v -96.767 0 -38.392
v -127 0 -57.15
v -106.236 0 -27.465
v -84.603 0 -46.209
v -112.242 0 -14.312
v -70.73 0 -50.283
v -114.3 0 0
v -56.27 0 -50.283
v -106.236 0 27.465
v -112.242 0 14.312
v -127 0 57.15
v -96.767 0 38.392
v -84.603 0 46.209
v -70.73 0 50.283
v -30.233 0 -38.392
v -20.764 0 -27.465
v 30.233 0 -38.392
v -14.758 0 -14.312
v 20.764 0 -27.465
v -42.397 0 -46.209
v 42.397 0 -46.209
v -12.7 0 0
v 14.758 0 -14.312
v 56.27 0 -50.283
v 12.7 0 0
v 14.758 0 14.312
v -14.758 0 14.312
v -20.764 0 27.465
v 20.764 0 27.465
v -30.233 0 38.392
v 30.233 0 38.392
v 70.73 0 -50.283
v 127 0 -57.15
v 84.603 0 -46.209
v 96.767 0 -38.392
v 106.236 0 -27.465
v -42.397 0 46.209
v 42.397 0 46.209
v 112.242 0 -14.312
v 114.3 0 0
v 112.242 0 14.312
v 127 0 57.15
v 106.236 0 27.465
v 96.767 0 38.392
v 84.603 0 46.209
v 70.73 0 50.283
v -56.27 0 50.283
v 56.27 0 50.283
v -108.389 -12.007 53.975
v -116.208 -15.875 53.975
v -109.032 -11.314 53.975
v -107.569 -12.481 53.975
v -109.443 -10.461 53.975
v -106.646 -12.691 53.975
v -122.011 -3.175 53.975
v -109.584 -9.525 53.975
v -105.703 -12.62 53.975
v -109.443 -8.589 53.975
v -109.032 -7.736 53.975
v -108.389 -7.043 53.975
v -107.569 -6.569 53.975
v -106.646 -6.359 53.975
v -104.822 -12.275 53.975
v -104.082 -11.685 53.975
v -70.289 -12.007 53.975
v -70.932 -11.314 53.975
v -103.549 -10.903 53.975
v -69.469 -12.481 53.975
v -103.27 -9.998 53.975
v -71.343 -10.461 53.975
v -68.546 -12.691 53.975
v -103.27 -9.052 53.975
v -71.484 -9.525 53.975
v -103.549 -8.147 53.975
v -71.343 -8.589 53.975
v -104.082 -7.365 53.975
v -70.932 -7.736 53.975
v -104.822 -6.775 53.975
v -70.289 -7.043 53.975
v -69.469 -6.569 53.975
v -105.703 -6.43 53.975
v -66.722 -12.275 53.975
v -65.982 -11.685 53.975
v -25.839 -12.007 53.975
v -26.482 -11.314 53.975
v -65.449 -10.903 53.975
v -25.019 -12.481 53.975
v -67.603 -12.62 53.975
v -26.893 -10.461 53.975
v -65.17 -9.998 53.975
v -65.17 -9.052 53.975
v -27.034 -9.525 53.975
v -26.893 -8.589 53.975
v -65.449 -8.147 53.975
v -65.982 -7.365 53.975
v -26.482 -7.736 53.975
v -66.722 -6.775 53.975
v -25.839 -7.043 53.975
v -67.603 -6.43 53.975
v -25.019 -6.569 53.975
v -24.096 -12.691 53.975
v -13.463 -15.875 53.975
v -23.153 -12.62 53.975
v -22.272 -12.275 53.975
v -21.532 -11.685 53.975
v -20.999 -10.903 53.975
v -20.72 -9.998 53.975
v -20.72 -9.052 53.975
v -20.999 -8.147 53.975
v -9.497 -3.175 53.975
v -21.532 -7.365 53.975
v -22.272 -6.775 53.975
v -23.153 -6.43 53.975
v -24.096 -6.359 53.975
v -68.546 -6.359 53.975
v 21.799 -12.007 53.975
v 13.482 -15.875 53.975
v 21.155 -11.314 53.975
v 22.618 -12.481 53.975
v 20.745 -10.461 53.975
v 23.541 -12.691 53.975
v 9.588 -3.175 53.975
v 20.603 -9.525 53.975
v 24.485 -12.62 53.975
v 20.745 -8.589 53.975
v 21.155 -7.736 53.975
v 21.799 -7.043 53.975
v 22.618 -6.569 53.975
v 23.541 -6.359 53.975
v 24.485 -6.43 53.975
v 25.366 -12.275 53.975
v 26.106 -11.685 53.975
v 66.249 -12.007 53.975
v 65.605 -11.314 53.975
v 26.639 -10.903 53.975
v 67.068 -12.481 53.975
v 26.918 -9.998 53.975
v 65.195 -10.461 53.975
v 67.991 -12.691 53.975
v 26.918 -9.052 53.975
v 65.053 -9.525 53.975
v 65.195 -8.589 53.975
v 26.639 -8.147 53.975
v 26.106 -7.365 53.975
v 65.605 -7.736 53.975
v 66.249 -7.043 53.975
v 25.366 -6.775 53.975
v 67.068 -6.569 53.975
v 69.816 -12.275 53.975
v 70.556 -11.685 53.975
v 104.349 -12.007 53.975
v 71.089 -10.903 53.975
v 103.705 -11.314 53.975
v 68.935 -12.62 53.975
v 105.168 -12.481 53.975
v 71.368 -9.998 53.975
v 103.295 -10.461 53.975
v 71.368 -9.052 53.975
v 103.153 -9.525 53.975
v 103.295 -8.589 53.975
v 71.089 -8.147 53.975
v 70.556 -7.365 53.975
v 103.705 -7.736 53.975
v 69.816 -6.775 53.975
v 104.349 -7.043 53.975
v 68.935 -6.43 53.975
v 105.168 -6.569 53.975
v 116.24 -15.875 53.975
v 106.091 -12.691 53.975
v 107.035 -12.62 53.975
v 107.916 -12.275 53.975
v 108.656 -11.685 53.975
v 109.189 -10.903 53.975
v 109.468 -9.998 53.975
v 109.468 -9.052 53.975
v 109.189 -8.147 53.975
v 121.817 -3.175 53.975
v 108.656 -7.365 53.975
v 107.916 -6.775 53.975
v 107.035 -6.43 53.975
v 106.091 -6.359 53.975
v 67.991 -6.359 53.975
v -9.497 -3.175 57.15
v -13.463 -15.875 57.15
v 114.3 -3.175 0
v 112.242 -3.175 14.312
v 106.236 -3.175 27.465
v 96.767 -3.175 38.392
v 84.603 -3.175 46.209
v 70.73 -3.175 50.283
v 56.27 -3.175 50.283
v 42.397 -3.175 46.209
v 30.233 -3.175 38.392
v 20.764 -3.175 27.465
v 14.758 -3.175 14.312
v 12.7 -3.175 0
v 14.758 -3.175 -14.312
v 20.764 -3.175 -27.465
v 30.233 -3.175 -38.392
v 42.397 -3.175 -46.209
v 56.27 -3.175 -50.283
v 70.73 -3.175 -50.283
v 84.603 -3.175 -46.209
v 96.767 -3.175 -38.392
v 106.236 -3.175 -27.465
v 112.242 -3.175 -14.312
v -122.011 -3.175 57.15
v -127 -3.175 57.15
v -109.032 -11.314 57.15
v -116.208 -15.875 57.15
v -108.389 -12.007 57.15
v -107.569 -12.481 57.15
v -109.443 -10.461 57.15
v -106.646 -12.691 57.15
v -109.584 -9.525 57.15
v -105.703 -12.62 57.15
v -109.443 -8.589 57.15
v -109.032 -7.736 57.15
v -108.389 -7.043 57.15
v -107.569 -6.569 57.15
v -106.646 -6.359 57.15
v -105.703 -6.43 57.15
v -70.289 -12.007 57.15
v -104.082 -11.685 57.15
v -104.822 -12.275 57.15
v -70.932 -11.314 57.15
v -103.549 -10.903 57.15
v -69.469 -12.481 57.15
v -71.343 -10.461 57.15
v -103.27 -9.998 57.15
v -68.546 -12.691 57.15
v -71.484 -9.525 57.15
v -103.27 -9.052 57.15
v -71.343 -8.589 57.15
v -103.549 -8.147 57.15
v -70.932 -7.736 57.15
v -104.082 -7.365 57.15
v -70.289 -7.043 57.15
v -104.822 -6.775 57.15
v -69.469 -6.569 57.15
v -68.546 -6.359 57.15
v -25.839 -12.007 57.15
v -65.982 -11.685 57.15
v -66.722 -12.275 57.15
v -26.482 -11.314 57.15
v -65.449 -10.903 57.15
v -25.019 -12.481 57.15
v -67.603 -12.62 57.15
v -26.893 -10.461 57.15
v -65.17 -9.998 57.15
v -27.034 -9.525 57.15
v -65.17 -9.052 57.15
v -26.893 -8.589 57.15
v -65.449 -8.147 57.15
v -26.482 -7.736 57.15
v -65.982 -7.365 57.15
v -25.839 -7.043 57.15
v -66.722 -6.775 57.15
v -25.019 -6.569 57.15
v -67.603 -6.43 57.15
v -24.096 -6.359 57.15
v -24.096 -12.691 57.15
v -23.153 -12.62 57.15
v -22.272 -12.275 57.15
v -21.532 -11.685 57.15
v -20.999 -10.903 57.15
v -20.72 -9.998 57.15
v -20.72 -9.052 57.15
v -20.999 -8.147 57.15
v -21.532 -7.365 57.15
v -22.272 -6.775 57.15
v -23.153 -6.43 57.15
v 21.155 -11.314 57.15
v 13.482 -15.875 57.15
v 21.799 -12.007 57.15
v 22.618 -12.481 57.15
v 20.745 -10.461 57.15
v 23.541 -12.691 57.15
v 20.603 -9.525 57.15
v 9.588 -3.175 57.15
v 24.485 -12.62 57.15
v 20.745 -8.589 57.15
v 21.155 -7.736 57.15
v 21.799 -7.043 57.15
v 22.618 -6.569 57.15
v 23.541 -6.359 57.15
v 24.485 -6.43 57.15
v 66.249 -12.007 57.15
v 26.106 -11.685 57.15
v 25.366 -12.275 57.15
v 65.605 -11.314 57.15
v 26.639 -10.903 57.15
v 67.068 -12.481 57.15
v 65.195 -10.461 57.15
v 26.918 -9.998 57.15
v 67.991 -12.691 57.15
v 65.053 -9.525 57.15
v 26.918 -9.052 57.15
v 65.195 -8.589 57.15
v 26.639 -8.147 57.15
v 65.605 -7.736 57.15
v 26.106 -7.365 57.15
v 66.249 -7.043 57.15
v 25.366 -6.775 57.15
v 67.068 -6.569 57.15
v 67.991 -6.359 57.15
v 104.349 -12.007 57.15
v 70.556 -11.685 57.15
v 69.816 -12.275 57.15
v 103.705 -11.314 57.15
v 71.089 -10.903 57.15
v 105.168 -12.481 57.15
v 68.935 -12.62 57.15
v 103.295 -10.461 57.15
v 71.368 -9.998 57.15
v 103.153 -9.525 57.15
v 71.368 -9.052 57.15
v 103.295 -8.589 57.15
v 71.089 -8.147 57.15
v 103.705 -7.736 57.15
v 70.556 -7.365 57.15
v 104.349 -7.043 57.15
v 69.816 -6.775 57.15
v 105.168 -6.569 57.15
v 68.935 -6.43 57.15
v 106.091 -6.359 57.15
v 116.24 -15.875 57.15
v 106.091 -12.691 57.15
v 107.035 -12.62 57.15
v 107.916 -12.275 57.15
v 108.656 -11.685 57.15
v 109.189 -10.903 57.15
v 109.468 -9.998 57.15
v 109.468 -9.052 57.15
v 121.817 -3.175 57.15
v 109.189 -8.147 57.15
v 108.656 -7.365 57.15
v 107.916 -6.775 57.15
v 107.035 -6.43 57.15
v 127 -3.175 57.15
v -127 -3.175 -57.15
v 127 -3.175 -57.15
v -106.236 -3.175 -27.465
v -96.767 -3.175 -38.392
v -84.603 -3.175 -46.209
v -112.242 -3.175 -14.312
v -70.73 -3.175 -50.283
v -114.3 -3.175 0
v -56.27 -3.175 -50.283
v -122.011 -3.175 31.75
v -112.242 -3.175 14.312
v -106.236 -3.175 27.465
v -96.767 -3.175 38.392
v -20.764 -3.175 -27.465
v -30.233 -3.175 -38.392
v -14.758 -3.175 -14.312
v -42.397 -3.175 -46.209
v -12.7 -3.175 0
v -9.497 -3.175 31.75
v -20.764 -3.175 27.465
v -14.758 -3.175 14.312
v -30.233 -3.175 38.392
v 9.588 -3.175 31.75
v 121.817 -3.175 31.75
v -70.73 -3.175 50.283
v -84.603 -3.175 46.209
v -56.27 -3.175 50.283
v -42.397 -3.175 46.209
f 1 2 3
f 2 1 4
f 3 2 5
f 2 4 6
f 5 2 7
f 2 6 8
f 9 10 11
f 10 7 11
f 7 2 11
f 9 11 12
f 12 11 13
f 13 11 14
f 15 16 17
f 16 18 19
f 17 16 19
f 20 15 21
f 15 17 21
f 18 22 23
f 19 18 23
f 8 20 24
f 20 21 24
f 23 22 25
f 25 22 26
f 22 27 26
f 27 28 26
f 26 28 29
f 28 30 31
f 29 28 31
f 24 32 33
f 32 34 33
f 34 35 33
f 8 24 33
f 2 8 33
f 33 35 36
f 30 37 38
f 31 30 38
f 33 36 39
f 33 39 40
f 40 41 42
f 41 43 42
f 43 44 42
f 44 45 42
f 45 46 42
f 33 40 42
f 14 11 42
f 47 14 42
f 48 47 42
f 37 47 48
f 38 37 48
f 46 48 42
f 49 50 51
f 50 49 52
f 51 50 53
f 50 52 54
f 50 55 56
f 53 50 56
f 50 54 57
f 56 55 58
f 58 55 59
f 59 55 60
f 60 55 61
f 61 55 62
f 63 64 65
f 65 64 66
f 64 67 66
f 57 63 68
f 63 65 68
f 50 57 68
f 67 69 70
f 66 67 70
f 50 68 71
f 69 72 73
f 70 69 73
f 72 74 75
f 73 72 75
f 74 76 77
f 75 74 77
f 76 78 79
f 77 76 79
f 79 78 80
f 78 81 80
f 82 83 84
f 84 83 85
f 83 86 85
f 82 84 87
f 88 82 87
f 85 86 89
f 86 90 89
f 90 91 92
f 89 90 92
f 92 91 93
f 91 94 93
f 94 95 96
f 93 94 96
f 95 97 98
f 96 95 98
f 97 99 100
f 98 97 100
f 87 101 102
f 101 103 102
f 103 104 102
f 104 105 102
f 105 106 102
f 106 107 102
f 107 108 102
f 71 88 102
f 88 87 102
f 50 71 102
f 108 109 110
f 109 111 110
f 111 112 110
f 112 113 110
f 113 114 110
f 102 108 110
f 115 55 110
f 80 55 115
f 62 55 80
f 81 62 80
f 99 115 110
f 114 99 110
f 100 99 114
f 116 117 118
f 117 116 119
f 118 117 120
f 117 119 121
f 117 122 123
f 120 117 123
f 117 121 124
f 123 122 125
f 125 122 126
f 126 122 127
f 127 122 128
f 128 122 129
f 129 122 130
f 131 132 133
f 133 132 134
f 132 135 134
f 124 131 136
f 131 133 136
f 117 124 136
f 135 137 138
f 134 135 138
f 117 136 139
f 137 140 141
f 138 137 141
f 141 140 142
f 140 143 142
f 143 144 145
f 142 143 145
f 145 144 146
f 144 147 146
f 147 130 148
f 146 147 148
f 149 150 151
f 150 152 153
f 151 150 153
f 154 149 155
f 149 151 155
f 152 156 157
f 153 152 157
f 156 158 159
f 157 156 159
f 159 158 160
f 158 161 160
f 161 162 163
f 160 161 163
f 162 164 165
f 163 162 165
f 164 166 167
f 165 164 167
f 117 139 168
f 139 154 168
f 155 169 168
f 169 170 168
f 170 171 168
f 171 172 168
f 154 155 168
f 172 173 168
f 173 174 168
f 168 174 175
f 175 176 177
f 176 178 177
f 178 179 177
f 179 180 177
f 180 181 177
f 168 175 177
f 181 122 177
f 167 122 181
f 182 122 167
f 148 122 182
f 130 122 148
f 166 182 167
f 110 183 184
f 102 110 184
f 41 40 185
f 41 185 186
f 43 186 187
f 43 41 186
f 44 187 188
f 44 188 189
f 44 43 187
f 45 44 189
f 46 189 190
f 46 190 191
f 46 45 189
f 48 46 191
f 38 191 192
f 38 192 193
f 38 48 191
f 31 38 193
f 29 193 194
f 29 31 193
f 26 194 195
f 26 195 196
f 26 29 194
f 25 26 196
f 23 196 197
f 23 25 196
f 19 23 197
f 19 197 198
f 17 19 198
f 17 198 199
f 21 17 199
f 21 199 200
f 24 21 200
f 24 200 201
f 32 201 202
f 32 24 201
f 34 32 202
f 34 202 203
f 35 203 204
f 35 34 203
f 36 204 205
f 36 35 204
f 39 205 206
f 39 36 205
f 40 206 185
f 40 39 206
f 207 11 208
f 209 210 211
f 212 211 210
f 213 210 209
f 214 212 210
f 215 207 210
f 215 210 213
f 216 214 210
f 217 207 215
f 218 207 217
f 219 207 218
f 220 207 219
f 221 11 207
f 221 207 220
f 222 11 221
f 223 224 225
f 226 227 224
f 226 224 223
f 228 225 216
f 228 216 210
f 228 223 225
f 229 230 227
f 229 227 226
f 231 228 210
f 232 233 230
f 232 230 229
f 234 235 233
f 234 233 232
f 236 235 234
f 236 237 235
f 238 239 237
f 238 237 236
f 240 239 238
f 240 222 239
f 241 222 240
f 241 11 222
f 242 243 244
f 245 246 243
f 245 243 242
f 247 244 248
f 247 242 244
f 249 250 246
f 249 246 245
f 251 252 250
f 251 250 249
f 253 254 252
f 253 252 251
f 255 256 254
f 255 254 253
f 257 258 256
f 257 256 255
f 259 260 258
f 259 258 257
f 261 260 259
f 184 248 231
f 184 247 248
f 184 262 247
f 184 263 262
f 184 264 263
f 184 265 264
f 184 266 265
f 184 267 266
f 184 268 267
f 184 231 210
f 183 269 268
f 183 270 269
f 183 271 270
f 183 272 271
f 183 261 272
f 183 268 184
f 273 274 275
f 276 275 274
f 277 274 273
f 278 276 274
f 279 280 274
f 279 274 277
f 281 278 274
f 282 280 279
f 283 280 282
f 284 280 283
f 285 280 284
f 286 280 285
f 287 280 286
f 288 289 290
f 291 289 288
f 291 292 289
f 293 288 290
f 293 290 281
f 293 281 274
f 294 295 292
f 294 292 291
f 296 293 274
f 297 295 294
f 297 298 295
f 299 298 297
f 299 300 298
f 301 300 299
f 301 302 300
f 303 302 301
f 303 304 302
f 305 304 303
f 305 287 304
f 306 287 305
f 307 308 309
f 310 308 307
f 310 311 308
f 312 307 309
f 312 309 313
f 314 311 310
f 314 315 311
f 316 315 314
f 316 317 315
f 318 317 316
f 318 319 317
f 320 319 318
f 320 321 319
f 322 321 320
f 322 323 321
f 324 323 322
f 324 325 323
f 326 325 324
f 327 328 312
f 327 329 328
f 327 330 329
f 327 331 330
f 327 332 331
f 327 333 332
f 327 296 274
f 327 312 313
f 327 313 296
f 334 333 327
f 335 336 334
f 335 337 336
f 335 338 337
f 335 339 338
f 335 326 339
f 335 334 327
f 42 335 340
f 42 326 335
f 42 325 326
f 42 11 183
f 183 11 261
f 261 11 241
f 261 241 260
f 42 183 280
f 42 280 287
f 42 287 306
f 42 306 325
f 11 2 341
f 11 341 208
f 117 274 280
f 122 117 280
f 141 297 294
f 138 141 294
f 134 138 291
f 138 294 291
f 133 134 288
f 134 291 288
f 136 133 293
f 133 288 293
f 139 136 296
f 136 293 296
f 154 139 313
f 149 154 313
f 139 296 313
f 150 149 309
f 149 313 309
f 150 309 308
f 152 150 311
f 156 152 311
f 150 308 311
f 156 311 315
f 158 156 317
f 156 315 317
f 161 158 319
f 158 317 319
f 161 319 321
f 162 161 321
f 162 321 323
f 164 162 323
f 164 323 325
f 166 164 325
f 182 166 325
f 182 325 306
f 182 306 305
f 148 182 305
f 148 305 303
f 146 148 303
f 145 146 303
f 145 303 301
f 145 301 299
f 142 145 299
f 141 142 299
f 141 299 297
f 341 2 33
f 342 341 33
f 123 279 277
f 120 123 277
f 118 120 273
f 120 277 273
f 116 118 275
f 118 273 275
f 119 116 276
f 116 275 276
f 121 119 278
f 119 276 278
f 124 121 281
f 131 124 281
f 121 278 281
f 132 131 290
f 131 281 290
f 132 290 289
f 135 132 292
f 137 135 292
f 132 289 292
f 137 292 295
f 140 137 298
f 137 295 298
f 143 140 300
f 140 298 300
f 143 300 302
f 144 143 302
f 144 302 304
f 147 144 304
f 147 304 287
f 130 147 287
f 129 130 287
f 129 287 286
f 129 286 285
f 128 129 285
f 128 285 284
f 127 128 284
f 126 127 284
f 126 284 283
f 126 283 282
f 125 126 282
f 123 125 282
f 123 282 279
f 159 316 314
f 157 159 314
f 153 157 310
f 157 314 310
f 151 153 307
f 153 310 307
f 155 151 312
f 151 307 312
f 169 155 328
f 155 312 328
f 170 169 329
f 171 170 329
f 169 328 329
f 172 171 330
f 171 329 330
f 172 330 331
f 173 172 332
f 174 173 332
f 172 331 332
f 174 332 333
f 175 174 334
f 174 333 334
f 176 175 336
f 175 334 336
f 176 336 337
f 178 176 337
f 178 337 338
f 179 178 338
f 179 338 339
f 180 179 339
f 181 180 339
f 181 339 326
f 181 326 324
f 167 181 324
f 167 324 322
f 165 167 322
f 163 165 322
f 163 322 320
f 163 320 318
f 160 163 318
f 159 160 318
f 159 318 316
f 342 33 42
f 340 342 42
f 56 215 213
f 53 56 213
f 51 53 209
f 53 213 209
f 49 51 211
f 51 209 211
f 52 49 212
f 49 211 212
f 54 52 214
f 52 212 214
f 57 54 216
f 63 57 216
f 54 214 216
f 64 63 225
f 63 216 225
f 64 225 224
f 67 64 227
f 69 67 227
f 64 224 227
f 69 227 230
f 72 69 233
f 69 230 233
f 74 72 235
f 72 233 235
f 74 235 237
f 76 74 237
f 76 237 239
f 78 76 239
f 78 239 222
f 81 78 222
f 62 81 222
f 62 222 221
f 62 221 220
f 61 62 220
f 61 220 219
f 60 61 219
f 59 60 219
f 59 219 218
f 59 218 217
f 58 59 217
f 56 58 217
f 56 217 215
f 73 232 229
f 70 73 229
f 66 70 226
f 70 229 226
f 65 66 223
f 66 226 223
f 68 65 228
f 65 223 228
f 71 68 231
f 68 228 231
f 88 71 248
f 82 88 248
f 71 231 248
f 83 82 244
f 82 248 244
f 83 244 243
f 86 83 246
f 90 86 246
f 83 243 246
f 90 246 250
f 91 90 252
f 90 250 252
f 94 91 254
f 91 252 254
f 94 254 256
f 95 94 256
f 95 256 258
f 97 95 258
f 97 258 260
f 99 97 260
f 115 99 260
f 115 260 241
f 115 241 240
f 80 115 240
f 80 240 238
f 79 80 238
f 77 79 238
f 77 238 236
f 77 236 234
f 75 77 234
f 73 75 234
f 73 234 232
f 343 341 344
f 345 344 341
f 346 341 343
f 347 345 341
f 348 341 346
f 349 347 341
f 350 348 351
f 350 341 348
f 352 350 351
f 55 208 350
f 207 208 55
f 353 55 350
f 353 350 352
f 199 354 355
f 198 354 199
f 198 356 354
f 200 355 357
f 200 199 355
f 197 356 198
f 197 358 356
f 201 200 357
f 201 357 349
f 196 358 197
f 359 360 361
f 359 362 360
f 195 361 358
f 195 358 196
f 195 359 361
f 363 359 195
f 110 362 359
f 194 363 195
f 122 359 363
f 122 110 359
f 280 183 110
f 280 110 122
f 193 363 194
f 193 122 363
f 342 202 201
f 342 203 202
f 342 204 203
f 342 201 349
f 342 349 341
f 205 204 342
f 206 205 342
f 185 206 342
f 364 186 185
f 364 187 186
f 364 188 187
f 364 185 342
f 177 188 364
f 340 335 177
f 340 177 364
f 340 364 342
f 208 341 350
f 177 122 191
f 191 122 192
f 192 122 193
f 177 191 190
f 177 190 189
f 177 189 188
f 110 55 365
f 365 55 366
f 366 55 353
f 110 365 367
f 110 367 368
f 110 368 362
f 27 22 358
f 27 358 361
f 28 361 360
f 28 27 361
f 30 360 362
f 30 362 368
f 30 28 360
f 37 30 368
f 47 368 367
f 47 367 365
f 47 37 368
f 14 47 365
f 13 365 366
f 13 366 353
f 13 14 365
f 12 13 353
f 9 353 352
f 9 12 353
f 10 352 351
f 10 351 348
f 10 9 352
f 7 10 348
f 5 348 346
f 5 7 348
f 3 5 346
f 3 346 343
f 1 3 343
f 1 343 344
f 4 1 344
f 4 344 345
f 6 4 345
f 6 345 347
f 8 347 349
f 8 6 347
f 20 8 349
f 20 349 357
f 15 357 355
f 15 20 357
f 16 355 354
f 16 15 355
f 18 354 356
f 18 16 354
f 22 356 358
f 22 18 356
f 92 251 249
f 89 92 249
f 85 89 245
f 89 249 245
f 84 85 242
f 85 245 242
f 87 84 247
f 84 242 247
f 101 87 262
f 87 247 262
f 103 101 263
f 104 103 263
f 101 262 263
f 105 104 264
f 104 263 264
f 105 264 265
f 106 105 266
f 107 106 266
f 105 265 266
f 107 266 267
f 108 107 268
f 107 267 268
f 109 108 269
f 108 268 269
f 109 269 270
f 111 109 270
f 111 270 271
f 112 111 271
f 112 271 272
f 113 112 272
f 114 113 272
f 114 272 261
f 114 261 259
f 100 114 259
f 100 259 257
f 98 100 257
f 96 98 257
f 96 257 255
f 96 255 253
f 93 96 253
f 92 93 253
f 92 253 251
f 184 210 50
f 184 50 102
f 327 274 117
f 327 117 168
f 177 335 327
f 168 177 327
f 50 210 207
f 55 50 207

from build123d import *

# Parameters (mm, degrees)
F0_W     = 254
F0_H     = 114.3
F0_R     = 50.8
F1_DEPTH = 3.175
F2_W     = 112.5140171498
F2_H     = 3.175
F2_W_2   = 112.2281569988
F3_DEPTH = 12.7
F5_DEPTH = 25.4
F7_DEPTH = 25.4


with BuildPart() as f1:
    # F0 (on Front) → F1 (new body)
    with BuildSketch(Plane.XZ):
        Rectangle(F0_W, F0_H)
        with Locations((-63.5, 0)):
            Circle(F0_R, mode=Mode.SUBTRACT)
        with Locations((63.5, 0)):
            Circle(F0_R, mode=Mode.SUBTRACT)
    extrude(amount=F1_DEPTH)

    # F2 (on face) → F3 (join)
    with BuildSketch(Plane.XZ.offset(3.175)):
        with Locations((-65.7536098734, 55.5625)):
            Rectangle(F2_W, F2_H)
        with Locations((65.7025436531, 55.5625)):
            Rectangle(F2_W_2, F2_H)
    extrude(amount=F3_DEPTH)

    # F4 (on face) → F5 (cut)
    with BuildSketch(Plane.XY.offset(57.15)):
        Polygon((-116.2076666951, -15.875), (-122.0106184483, -3.175), (-122.0106184483, -15.875), align=None)
        Polygon((-9.4966012985, -15.875), (-9.4966012985, -3.175), (-13.4629756212, -15.875), align=None)
        Polygon((13.4817082435, -15.875), (9.5884651538, -3.175), (9.5884651538, -15.875), align=None)
        Polygon((116.2402704358, -15.875), (121.8166221525, -15.875), (121.8166221525, -3.175), align=None)
    extrude(amount=-F5_DEPTH, mode=Mode.SUBTRACT)

    # F6 (on face) → F7 (cut)
    with BuildSketch(Plane.XY.offset(57.15)):
        with BuildLine():
            ThreePointArc((-103.2341425717, -9.525), (-106.4091425717, -6.35), (-109.5841425717, -9.525))
            Line((-109.5841425717, -9.525), (-103.2341425717, -9.525))
        make_face()
        with BuildLine():
            ThreePointArc((109.5034462942, -9.525), (106.3284462942, -6.35), (103.1534462942, -9.525))
            Line((103.1534462942, -9.525), (109.5034462942, -9.525))
        make_face()
        with BuildLine():
            Line((109.5034462942, -9.525), (103.1534462942, -9.525))
            ThreePointArc((103.1534462942, -9.525), (106.3284462942, -12.7), (109.5034462942, -9.525))
        make_face()
        with BuildLine():
            ThreePointArc((71.4034462942, -9.525), (68.2284462942, -6.35), (65.0534462942, -9.525))
            Line((65.0534462942, -9.525), (71.4034462942, -9.525))
        make_face()
        with BuildLine():
            Line((71.4034462942, -9.525), (65.0534462942, -9.525))
            ThreePointArc((65.0534462942, -9.525), (68.2284462942, -12.7), (71.4034462942, -9.525))
        make_face()
        with BuildLine():
            ThreePointArc((26.9534462942, -9.525), (23.7784462942, -6.35), (20.6034462942, -9.525))
            Line((20.6034462942, -9.525), (26.9534462942, -9.525))
        make_face()
        with BuildLine():
            Line((26.9534462942, -9.525), (20.6034462942, -9.525))
            ThreePointArc((20.6034462942, -9.525), (23.7784462942, -12.7), (26.9534462942, -9.525))
        make_face()
        with BuildLine():
            ThreePointArc((-20.6841425717, -9.525), (-23.8591425717, -6.35), (-27.0341425717, -9.525))
            Line((-27.0341425717, -9.525), (-20.6841425717, -9.525))
        make_face()
        with BuildLine():
            Line((-20.6841425717, -9.525), (-27.0341425717, -9.525))
            ThreePointArc((-27.0341425717, -9.525), (-23.8591425717, -12.7), (-20.6841425717, -9.525))
        make_face()
        with BuildLine():
            ThreePointArc((-65.1341425717, -9.525), (-68.3091425717, -6.35), (-71.4841425717, -9.525))
            Line((-71.4841425717, -9.525), (-65.1341425717, -9.525))
        make_face()
        with BuildLine():
            Line((-65.1341425717, -9.525), (-71.4841425717, -9.525))
            ThreePointArc((-71.4841425717, -9.525), (-68.3091425717, -12.7), (-65.1341425717, -9.525))
        make_face()
        with BuildLine():
            Line((-103.2341425717, -9.525), (-109.5841425717, -9.525))
            ThreePointArc((-109.5841425717, -9.525), (-106.4091425717, -12.7), (-103.2341425717, -9.525))
        make_face()
    extrude(amount=-F7_DEPTH, mode=Mode.SUBTRACT)


solid = f1.part
